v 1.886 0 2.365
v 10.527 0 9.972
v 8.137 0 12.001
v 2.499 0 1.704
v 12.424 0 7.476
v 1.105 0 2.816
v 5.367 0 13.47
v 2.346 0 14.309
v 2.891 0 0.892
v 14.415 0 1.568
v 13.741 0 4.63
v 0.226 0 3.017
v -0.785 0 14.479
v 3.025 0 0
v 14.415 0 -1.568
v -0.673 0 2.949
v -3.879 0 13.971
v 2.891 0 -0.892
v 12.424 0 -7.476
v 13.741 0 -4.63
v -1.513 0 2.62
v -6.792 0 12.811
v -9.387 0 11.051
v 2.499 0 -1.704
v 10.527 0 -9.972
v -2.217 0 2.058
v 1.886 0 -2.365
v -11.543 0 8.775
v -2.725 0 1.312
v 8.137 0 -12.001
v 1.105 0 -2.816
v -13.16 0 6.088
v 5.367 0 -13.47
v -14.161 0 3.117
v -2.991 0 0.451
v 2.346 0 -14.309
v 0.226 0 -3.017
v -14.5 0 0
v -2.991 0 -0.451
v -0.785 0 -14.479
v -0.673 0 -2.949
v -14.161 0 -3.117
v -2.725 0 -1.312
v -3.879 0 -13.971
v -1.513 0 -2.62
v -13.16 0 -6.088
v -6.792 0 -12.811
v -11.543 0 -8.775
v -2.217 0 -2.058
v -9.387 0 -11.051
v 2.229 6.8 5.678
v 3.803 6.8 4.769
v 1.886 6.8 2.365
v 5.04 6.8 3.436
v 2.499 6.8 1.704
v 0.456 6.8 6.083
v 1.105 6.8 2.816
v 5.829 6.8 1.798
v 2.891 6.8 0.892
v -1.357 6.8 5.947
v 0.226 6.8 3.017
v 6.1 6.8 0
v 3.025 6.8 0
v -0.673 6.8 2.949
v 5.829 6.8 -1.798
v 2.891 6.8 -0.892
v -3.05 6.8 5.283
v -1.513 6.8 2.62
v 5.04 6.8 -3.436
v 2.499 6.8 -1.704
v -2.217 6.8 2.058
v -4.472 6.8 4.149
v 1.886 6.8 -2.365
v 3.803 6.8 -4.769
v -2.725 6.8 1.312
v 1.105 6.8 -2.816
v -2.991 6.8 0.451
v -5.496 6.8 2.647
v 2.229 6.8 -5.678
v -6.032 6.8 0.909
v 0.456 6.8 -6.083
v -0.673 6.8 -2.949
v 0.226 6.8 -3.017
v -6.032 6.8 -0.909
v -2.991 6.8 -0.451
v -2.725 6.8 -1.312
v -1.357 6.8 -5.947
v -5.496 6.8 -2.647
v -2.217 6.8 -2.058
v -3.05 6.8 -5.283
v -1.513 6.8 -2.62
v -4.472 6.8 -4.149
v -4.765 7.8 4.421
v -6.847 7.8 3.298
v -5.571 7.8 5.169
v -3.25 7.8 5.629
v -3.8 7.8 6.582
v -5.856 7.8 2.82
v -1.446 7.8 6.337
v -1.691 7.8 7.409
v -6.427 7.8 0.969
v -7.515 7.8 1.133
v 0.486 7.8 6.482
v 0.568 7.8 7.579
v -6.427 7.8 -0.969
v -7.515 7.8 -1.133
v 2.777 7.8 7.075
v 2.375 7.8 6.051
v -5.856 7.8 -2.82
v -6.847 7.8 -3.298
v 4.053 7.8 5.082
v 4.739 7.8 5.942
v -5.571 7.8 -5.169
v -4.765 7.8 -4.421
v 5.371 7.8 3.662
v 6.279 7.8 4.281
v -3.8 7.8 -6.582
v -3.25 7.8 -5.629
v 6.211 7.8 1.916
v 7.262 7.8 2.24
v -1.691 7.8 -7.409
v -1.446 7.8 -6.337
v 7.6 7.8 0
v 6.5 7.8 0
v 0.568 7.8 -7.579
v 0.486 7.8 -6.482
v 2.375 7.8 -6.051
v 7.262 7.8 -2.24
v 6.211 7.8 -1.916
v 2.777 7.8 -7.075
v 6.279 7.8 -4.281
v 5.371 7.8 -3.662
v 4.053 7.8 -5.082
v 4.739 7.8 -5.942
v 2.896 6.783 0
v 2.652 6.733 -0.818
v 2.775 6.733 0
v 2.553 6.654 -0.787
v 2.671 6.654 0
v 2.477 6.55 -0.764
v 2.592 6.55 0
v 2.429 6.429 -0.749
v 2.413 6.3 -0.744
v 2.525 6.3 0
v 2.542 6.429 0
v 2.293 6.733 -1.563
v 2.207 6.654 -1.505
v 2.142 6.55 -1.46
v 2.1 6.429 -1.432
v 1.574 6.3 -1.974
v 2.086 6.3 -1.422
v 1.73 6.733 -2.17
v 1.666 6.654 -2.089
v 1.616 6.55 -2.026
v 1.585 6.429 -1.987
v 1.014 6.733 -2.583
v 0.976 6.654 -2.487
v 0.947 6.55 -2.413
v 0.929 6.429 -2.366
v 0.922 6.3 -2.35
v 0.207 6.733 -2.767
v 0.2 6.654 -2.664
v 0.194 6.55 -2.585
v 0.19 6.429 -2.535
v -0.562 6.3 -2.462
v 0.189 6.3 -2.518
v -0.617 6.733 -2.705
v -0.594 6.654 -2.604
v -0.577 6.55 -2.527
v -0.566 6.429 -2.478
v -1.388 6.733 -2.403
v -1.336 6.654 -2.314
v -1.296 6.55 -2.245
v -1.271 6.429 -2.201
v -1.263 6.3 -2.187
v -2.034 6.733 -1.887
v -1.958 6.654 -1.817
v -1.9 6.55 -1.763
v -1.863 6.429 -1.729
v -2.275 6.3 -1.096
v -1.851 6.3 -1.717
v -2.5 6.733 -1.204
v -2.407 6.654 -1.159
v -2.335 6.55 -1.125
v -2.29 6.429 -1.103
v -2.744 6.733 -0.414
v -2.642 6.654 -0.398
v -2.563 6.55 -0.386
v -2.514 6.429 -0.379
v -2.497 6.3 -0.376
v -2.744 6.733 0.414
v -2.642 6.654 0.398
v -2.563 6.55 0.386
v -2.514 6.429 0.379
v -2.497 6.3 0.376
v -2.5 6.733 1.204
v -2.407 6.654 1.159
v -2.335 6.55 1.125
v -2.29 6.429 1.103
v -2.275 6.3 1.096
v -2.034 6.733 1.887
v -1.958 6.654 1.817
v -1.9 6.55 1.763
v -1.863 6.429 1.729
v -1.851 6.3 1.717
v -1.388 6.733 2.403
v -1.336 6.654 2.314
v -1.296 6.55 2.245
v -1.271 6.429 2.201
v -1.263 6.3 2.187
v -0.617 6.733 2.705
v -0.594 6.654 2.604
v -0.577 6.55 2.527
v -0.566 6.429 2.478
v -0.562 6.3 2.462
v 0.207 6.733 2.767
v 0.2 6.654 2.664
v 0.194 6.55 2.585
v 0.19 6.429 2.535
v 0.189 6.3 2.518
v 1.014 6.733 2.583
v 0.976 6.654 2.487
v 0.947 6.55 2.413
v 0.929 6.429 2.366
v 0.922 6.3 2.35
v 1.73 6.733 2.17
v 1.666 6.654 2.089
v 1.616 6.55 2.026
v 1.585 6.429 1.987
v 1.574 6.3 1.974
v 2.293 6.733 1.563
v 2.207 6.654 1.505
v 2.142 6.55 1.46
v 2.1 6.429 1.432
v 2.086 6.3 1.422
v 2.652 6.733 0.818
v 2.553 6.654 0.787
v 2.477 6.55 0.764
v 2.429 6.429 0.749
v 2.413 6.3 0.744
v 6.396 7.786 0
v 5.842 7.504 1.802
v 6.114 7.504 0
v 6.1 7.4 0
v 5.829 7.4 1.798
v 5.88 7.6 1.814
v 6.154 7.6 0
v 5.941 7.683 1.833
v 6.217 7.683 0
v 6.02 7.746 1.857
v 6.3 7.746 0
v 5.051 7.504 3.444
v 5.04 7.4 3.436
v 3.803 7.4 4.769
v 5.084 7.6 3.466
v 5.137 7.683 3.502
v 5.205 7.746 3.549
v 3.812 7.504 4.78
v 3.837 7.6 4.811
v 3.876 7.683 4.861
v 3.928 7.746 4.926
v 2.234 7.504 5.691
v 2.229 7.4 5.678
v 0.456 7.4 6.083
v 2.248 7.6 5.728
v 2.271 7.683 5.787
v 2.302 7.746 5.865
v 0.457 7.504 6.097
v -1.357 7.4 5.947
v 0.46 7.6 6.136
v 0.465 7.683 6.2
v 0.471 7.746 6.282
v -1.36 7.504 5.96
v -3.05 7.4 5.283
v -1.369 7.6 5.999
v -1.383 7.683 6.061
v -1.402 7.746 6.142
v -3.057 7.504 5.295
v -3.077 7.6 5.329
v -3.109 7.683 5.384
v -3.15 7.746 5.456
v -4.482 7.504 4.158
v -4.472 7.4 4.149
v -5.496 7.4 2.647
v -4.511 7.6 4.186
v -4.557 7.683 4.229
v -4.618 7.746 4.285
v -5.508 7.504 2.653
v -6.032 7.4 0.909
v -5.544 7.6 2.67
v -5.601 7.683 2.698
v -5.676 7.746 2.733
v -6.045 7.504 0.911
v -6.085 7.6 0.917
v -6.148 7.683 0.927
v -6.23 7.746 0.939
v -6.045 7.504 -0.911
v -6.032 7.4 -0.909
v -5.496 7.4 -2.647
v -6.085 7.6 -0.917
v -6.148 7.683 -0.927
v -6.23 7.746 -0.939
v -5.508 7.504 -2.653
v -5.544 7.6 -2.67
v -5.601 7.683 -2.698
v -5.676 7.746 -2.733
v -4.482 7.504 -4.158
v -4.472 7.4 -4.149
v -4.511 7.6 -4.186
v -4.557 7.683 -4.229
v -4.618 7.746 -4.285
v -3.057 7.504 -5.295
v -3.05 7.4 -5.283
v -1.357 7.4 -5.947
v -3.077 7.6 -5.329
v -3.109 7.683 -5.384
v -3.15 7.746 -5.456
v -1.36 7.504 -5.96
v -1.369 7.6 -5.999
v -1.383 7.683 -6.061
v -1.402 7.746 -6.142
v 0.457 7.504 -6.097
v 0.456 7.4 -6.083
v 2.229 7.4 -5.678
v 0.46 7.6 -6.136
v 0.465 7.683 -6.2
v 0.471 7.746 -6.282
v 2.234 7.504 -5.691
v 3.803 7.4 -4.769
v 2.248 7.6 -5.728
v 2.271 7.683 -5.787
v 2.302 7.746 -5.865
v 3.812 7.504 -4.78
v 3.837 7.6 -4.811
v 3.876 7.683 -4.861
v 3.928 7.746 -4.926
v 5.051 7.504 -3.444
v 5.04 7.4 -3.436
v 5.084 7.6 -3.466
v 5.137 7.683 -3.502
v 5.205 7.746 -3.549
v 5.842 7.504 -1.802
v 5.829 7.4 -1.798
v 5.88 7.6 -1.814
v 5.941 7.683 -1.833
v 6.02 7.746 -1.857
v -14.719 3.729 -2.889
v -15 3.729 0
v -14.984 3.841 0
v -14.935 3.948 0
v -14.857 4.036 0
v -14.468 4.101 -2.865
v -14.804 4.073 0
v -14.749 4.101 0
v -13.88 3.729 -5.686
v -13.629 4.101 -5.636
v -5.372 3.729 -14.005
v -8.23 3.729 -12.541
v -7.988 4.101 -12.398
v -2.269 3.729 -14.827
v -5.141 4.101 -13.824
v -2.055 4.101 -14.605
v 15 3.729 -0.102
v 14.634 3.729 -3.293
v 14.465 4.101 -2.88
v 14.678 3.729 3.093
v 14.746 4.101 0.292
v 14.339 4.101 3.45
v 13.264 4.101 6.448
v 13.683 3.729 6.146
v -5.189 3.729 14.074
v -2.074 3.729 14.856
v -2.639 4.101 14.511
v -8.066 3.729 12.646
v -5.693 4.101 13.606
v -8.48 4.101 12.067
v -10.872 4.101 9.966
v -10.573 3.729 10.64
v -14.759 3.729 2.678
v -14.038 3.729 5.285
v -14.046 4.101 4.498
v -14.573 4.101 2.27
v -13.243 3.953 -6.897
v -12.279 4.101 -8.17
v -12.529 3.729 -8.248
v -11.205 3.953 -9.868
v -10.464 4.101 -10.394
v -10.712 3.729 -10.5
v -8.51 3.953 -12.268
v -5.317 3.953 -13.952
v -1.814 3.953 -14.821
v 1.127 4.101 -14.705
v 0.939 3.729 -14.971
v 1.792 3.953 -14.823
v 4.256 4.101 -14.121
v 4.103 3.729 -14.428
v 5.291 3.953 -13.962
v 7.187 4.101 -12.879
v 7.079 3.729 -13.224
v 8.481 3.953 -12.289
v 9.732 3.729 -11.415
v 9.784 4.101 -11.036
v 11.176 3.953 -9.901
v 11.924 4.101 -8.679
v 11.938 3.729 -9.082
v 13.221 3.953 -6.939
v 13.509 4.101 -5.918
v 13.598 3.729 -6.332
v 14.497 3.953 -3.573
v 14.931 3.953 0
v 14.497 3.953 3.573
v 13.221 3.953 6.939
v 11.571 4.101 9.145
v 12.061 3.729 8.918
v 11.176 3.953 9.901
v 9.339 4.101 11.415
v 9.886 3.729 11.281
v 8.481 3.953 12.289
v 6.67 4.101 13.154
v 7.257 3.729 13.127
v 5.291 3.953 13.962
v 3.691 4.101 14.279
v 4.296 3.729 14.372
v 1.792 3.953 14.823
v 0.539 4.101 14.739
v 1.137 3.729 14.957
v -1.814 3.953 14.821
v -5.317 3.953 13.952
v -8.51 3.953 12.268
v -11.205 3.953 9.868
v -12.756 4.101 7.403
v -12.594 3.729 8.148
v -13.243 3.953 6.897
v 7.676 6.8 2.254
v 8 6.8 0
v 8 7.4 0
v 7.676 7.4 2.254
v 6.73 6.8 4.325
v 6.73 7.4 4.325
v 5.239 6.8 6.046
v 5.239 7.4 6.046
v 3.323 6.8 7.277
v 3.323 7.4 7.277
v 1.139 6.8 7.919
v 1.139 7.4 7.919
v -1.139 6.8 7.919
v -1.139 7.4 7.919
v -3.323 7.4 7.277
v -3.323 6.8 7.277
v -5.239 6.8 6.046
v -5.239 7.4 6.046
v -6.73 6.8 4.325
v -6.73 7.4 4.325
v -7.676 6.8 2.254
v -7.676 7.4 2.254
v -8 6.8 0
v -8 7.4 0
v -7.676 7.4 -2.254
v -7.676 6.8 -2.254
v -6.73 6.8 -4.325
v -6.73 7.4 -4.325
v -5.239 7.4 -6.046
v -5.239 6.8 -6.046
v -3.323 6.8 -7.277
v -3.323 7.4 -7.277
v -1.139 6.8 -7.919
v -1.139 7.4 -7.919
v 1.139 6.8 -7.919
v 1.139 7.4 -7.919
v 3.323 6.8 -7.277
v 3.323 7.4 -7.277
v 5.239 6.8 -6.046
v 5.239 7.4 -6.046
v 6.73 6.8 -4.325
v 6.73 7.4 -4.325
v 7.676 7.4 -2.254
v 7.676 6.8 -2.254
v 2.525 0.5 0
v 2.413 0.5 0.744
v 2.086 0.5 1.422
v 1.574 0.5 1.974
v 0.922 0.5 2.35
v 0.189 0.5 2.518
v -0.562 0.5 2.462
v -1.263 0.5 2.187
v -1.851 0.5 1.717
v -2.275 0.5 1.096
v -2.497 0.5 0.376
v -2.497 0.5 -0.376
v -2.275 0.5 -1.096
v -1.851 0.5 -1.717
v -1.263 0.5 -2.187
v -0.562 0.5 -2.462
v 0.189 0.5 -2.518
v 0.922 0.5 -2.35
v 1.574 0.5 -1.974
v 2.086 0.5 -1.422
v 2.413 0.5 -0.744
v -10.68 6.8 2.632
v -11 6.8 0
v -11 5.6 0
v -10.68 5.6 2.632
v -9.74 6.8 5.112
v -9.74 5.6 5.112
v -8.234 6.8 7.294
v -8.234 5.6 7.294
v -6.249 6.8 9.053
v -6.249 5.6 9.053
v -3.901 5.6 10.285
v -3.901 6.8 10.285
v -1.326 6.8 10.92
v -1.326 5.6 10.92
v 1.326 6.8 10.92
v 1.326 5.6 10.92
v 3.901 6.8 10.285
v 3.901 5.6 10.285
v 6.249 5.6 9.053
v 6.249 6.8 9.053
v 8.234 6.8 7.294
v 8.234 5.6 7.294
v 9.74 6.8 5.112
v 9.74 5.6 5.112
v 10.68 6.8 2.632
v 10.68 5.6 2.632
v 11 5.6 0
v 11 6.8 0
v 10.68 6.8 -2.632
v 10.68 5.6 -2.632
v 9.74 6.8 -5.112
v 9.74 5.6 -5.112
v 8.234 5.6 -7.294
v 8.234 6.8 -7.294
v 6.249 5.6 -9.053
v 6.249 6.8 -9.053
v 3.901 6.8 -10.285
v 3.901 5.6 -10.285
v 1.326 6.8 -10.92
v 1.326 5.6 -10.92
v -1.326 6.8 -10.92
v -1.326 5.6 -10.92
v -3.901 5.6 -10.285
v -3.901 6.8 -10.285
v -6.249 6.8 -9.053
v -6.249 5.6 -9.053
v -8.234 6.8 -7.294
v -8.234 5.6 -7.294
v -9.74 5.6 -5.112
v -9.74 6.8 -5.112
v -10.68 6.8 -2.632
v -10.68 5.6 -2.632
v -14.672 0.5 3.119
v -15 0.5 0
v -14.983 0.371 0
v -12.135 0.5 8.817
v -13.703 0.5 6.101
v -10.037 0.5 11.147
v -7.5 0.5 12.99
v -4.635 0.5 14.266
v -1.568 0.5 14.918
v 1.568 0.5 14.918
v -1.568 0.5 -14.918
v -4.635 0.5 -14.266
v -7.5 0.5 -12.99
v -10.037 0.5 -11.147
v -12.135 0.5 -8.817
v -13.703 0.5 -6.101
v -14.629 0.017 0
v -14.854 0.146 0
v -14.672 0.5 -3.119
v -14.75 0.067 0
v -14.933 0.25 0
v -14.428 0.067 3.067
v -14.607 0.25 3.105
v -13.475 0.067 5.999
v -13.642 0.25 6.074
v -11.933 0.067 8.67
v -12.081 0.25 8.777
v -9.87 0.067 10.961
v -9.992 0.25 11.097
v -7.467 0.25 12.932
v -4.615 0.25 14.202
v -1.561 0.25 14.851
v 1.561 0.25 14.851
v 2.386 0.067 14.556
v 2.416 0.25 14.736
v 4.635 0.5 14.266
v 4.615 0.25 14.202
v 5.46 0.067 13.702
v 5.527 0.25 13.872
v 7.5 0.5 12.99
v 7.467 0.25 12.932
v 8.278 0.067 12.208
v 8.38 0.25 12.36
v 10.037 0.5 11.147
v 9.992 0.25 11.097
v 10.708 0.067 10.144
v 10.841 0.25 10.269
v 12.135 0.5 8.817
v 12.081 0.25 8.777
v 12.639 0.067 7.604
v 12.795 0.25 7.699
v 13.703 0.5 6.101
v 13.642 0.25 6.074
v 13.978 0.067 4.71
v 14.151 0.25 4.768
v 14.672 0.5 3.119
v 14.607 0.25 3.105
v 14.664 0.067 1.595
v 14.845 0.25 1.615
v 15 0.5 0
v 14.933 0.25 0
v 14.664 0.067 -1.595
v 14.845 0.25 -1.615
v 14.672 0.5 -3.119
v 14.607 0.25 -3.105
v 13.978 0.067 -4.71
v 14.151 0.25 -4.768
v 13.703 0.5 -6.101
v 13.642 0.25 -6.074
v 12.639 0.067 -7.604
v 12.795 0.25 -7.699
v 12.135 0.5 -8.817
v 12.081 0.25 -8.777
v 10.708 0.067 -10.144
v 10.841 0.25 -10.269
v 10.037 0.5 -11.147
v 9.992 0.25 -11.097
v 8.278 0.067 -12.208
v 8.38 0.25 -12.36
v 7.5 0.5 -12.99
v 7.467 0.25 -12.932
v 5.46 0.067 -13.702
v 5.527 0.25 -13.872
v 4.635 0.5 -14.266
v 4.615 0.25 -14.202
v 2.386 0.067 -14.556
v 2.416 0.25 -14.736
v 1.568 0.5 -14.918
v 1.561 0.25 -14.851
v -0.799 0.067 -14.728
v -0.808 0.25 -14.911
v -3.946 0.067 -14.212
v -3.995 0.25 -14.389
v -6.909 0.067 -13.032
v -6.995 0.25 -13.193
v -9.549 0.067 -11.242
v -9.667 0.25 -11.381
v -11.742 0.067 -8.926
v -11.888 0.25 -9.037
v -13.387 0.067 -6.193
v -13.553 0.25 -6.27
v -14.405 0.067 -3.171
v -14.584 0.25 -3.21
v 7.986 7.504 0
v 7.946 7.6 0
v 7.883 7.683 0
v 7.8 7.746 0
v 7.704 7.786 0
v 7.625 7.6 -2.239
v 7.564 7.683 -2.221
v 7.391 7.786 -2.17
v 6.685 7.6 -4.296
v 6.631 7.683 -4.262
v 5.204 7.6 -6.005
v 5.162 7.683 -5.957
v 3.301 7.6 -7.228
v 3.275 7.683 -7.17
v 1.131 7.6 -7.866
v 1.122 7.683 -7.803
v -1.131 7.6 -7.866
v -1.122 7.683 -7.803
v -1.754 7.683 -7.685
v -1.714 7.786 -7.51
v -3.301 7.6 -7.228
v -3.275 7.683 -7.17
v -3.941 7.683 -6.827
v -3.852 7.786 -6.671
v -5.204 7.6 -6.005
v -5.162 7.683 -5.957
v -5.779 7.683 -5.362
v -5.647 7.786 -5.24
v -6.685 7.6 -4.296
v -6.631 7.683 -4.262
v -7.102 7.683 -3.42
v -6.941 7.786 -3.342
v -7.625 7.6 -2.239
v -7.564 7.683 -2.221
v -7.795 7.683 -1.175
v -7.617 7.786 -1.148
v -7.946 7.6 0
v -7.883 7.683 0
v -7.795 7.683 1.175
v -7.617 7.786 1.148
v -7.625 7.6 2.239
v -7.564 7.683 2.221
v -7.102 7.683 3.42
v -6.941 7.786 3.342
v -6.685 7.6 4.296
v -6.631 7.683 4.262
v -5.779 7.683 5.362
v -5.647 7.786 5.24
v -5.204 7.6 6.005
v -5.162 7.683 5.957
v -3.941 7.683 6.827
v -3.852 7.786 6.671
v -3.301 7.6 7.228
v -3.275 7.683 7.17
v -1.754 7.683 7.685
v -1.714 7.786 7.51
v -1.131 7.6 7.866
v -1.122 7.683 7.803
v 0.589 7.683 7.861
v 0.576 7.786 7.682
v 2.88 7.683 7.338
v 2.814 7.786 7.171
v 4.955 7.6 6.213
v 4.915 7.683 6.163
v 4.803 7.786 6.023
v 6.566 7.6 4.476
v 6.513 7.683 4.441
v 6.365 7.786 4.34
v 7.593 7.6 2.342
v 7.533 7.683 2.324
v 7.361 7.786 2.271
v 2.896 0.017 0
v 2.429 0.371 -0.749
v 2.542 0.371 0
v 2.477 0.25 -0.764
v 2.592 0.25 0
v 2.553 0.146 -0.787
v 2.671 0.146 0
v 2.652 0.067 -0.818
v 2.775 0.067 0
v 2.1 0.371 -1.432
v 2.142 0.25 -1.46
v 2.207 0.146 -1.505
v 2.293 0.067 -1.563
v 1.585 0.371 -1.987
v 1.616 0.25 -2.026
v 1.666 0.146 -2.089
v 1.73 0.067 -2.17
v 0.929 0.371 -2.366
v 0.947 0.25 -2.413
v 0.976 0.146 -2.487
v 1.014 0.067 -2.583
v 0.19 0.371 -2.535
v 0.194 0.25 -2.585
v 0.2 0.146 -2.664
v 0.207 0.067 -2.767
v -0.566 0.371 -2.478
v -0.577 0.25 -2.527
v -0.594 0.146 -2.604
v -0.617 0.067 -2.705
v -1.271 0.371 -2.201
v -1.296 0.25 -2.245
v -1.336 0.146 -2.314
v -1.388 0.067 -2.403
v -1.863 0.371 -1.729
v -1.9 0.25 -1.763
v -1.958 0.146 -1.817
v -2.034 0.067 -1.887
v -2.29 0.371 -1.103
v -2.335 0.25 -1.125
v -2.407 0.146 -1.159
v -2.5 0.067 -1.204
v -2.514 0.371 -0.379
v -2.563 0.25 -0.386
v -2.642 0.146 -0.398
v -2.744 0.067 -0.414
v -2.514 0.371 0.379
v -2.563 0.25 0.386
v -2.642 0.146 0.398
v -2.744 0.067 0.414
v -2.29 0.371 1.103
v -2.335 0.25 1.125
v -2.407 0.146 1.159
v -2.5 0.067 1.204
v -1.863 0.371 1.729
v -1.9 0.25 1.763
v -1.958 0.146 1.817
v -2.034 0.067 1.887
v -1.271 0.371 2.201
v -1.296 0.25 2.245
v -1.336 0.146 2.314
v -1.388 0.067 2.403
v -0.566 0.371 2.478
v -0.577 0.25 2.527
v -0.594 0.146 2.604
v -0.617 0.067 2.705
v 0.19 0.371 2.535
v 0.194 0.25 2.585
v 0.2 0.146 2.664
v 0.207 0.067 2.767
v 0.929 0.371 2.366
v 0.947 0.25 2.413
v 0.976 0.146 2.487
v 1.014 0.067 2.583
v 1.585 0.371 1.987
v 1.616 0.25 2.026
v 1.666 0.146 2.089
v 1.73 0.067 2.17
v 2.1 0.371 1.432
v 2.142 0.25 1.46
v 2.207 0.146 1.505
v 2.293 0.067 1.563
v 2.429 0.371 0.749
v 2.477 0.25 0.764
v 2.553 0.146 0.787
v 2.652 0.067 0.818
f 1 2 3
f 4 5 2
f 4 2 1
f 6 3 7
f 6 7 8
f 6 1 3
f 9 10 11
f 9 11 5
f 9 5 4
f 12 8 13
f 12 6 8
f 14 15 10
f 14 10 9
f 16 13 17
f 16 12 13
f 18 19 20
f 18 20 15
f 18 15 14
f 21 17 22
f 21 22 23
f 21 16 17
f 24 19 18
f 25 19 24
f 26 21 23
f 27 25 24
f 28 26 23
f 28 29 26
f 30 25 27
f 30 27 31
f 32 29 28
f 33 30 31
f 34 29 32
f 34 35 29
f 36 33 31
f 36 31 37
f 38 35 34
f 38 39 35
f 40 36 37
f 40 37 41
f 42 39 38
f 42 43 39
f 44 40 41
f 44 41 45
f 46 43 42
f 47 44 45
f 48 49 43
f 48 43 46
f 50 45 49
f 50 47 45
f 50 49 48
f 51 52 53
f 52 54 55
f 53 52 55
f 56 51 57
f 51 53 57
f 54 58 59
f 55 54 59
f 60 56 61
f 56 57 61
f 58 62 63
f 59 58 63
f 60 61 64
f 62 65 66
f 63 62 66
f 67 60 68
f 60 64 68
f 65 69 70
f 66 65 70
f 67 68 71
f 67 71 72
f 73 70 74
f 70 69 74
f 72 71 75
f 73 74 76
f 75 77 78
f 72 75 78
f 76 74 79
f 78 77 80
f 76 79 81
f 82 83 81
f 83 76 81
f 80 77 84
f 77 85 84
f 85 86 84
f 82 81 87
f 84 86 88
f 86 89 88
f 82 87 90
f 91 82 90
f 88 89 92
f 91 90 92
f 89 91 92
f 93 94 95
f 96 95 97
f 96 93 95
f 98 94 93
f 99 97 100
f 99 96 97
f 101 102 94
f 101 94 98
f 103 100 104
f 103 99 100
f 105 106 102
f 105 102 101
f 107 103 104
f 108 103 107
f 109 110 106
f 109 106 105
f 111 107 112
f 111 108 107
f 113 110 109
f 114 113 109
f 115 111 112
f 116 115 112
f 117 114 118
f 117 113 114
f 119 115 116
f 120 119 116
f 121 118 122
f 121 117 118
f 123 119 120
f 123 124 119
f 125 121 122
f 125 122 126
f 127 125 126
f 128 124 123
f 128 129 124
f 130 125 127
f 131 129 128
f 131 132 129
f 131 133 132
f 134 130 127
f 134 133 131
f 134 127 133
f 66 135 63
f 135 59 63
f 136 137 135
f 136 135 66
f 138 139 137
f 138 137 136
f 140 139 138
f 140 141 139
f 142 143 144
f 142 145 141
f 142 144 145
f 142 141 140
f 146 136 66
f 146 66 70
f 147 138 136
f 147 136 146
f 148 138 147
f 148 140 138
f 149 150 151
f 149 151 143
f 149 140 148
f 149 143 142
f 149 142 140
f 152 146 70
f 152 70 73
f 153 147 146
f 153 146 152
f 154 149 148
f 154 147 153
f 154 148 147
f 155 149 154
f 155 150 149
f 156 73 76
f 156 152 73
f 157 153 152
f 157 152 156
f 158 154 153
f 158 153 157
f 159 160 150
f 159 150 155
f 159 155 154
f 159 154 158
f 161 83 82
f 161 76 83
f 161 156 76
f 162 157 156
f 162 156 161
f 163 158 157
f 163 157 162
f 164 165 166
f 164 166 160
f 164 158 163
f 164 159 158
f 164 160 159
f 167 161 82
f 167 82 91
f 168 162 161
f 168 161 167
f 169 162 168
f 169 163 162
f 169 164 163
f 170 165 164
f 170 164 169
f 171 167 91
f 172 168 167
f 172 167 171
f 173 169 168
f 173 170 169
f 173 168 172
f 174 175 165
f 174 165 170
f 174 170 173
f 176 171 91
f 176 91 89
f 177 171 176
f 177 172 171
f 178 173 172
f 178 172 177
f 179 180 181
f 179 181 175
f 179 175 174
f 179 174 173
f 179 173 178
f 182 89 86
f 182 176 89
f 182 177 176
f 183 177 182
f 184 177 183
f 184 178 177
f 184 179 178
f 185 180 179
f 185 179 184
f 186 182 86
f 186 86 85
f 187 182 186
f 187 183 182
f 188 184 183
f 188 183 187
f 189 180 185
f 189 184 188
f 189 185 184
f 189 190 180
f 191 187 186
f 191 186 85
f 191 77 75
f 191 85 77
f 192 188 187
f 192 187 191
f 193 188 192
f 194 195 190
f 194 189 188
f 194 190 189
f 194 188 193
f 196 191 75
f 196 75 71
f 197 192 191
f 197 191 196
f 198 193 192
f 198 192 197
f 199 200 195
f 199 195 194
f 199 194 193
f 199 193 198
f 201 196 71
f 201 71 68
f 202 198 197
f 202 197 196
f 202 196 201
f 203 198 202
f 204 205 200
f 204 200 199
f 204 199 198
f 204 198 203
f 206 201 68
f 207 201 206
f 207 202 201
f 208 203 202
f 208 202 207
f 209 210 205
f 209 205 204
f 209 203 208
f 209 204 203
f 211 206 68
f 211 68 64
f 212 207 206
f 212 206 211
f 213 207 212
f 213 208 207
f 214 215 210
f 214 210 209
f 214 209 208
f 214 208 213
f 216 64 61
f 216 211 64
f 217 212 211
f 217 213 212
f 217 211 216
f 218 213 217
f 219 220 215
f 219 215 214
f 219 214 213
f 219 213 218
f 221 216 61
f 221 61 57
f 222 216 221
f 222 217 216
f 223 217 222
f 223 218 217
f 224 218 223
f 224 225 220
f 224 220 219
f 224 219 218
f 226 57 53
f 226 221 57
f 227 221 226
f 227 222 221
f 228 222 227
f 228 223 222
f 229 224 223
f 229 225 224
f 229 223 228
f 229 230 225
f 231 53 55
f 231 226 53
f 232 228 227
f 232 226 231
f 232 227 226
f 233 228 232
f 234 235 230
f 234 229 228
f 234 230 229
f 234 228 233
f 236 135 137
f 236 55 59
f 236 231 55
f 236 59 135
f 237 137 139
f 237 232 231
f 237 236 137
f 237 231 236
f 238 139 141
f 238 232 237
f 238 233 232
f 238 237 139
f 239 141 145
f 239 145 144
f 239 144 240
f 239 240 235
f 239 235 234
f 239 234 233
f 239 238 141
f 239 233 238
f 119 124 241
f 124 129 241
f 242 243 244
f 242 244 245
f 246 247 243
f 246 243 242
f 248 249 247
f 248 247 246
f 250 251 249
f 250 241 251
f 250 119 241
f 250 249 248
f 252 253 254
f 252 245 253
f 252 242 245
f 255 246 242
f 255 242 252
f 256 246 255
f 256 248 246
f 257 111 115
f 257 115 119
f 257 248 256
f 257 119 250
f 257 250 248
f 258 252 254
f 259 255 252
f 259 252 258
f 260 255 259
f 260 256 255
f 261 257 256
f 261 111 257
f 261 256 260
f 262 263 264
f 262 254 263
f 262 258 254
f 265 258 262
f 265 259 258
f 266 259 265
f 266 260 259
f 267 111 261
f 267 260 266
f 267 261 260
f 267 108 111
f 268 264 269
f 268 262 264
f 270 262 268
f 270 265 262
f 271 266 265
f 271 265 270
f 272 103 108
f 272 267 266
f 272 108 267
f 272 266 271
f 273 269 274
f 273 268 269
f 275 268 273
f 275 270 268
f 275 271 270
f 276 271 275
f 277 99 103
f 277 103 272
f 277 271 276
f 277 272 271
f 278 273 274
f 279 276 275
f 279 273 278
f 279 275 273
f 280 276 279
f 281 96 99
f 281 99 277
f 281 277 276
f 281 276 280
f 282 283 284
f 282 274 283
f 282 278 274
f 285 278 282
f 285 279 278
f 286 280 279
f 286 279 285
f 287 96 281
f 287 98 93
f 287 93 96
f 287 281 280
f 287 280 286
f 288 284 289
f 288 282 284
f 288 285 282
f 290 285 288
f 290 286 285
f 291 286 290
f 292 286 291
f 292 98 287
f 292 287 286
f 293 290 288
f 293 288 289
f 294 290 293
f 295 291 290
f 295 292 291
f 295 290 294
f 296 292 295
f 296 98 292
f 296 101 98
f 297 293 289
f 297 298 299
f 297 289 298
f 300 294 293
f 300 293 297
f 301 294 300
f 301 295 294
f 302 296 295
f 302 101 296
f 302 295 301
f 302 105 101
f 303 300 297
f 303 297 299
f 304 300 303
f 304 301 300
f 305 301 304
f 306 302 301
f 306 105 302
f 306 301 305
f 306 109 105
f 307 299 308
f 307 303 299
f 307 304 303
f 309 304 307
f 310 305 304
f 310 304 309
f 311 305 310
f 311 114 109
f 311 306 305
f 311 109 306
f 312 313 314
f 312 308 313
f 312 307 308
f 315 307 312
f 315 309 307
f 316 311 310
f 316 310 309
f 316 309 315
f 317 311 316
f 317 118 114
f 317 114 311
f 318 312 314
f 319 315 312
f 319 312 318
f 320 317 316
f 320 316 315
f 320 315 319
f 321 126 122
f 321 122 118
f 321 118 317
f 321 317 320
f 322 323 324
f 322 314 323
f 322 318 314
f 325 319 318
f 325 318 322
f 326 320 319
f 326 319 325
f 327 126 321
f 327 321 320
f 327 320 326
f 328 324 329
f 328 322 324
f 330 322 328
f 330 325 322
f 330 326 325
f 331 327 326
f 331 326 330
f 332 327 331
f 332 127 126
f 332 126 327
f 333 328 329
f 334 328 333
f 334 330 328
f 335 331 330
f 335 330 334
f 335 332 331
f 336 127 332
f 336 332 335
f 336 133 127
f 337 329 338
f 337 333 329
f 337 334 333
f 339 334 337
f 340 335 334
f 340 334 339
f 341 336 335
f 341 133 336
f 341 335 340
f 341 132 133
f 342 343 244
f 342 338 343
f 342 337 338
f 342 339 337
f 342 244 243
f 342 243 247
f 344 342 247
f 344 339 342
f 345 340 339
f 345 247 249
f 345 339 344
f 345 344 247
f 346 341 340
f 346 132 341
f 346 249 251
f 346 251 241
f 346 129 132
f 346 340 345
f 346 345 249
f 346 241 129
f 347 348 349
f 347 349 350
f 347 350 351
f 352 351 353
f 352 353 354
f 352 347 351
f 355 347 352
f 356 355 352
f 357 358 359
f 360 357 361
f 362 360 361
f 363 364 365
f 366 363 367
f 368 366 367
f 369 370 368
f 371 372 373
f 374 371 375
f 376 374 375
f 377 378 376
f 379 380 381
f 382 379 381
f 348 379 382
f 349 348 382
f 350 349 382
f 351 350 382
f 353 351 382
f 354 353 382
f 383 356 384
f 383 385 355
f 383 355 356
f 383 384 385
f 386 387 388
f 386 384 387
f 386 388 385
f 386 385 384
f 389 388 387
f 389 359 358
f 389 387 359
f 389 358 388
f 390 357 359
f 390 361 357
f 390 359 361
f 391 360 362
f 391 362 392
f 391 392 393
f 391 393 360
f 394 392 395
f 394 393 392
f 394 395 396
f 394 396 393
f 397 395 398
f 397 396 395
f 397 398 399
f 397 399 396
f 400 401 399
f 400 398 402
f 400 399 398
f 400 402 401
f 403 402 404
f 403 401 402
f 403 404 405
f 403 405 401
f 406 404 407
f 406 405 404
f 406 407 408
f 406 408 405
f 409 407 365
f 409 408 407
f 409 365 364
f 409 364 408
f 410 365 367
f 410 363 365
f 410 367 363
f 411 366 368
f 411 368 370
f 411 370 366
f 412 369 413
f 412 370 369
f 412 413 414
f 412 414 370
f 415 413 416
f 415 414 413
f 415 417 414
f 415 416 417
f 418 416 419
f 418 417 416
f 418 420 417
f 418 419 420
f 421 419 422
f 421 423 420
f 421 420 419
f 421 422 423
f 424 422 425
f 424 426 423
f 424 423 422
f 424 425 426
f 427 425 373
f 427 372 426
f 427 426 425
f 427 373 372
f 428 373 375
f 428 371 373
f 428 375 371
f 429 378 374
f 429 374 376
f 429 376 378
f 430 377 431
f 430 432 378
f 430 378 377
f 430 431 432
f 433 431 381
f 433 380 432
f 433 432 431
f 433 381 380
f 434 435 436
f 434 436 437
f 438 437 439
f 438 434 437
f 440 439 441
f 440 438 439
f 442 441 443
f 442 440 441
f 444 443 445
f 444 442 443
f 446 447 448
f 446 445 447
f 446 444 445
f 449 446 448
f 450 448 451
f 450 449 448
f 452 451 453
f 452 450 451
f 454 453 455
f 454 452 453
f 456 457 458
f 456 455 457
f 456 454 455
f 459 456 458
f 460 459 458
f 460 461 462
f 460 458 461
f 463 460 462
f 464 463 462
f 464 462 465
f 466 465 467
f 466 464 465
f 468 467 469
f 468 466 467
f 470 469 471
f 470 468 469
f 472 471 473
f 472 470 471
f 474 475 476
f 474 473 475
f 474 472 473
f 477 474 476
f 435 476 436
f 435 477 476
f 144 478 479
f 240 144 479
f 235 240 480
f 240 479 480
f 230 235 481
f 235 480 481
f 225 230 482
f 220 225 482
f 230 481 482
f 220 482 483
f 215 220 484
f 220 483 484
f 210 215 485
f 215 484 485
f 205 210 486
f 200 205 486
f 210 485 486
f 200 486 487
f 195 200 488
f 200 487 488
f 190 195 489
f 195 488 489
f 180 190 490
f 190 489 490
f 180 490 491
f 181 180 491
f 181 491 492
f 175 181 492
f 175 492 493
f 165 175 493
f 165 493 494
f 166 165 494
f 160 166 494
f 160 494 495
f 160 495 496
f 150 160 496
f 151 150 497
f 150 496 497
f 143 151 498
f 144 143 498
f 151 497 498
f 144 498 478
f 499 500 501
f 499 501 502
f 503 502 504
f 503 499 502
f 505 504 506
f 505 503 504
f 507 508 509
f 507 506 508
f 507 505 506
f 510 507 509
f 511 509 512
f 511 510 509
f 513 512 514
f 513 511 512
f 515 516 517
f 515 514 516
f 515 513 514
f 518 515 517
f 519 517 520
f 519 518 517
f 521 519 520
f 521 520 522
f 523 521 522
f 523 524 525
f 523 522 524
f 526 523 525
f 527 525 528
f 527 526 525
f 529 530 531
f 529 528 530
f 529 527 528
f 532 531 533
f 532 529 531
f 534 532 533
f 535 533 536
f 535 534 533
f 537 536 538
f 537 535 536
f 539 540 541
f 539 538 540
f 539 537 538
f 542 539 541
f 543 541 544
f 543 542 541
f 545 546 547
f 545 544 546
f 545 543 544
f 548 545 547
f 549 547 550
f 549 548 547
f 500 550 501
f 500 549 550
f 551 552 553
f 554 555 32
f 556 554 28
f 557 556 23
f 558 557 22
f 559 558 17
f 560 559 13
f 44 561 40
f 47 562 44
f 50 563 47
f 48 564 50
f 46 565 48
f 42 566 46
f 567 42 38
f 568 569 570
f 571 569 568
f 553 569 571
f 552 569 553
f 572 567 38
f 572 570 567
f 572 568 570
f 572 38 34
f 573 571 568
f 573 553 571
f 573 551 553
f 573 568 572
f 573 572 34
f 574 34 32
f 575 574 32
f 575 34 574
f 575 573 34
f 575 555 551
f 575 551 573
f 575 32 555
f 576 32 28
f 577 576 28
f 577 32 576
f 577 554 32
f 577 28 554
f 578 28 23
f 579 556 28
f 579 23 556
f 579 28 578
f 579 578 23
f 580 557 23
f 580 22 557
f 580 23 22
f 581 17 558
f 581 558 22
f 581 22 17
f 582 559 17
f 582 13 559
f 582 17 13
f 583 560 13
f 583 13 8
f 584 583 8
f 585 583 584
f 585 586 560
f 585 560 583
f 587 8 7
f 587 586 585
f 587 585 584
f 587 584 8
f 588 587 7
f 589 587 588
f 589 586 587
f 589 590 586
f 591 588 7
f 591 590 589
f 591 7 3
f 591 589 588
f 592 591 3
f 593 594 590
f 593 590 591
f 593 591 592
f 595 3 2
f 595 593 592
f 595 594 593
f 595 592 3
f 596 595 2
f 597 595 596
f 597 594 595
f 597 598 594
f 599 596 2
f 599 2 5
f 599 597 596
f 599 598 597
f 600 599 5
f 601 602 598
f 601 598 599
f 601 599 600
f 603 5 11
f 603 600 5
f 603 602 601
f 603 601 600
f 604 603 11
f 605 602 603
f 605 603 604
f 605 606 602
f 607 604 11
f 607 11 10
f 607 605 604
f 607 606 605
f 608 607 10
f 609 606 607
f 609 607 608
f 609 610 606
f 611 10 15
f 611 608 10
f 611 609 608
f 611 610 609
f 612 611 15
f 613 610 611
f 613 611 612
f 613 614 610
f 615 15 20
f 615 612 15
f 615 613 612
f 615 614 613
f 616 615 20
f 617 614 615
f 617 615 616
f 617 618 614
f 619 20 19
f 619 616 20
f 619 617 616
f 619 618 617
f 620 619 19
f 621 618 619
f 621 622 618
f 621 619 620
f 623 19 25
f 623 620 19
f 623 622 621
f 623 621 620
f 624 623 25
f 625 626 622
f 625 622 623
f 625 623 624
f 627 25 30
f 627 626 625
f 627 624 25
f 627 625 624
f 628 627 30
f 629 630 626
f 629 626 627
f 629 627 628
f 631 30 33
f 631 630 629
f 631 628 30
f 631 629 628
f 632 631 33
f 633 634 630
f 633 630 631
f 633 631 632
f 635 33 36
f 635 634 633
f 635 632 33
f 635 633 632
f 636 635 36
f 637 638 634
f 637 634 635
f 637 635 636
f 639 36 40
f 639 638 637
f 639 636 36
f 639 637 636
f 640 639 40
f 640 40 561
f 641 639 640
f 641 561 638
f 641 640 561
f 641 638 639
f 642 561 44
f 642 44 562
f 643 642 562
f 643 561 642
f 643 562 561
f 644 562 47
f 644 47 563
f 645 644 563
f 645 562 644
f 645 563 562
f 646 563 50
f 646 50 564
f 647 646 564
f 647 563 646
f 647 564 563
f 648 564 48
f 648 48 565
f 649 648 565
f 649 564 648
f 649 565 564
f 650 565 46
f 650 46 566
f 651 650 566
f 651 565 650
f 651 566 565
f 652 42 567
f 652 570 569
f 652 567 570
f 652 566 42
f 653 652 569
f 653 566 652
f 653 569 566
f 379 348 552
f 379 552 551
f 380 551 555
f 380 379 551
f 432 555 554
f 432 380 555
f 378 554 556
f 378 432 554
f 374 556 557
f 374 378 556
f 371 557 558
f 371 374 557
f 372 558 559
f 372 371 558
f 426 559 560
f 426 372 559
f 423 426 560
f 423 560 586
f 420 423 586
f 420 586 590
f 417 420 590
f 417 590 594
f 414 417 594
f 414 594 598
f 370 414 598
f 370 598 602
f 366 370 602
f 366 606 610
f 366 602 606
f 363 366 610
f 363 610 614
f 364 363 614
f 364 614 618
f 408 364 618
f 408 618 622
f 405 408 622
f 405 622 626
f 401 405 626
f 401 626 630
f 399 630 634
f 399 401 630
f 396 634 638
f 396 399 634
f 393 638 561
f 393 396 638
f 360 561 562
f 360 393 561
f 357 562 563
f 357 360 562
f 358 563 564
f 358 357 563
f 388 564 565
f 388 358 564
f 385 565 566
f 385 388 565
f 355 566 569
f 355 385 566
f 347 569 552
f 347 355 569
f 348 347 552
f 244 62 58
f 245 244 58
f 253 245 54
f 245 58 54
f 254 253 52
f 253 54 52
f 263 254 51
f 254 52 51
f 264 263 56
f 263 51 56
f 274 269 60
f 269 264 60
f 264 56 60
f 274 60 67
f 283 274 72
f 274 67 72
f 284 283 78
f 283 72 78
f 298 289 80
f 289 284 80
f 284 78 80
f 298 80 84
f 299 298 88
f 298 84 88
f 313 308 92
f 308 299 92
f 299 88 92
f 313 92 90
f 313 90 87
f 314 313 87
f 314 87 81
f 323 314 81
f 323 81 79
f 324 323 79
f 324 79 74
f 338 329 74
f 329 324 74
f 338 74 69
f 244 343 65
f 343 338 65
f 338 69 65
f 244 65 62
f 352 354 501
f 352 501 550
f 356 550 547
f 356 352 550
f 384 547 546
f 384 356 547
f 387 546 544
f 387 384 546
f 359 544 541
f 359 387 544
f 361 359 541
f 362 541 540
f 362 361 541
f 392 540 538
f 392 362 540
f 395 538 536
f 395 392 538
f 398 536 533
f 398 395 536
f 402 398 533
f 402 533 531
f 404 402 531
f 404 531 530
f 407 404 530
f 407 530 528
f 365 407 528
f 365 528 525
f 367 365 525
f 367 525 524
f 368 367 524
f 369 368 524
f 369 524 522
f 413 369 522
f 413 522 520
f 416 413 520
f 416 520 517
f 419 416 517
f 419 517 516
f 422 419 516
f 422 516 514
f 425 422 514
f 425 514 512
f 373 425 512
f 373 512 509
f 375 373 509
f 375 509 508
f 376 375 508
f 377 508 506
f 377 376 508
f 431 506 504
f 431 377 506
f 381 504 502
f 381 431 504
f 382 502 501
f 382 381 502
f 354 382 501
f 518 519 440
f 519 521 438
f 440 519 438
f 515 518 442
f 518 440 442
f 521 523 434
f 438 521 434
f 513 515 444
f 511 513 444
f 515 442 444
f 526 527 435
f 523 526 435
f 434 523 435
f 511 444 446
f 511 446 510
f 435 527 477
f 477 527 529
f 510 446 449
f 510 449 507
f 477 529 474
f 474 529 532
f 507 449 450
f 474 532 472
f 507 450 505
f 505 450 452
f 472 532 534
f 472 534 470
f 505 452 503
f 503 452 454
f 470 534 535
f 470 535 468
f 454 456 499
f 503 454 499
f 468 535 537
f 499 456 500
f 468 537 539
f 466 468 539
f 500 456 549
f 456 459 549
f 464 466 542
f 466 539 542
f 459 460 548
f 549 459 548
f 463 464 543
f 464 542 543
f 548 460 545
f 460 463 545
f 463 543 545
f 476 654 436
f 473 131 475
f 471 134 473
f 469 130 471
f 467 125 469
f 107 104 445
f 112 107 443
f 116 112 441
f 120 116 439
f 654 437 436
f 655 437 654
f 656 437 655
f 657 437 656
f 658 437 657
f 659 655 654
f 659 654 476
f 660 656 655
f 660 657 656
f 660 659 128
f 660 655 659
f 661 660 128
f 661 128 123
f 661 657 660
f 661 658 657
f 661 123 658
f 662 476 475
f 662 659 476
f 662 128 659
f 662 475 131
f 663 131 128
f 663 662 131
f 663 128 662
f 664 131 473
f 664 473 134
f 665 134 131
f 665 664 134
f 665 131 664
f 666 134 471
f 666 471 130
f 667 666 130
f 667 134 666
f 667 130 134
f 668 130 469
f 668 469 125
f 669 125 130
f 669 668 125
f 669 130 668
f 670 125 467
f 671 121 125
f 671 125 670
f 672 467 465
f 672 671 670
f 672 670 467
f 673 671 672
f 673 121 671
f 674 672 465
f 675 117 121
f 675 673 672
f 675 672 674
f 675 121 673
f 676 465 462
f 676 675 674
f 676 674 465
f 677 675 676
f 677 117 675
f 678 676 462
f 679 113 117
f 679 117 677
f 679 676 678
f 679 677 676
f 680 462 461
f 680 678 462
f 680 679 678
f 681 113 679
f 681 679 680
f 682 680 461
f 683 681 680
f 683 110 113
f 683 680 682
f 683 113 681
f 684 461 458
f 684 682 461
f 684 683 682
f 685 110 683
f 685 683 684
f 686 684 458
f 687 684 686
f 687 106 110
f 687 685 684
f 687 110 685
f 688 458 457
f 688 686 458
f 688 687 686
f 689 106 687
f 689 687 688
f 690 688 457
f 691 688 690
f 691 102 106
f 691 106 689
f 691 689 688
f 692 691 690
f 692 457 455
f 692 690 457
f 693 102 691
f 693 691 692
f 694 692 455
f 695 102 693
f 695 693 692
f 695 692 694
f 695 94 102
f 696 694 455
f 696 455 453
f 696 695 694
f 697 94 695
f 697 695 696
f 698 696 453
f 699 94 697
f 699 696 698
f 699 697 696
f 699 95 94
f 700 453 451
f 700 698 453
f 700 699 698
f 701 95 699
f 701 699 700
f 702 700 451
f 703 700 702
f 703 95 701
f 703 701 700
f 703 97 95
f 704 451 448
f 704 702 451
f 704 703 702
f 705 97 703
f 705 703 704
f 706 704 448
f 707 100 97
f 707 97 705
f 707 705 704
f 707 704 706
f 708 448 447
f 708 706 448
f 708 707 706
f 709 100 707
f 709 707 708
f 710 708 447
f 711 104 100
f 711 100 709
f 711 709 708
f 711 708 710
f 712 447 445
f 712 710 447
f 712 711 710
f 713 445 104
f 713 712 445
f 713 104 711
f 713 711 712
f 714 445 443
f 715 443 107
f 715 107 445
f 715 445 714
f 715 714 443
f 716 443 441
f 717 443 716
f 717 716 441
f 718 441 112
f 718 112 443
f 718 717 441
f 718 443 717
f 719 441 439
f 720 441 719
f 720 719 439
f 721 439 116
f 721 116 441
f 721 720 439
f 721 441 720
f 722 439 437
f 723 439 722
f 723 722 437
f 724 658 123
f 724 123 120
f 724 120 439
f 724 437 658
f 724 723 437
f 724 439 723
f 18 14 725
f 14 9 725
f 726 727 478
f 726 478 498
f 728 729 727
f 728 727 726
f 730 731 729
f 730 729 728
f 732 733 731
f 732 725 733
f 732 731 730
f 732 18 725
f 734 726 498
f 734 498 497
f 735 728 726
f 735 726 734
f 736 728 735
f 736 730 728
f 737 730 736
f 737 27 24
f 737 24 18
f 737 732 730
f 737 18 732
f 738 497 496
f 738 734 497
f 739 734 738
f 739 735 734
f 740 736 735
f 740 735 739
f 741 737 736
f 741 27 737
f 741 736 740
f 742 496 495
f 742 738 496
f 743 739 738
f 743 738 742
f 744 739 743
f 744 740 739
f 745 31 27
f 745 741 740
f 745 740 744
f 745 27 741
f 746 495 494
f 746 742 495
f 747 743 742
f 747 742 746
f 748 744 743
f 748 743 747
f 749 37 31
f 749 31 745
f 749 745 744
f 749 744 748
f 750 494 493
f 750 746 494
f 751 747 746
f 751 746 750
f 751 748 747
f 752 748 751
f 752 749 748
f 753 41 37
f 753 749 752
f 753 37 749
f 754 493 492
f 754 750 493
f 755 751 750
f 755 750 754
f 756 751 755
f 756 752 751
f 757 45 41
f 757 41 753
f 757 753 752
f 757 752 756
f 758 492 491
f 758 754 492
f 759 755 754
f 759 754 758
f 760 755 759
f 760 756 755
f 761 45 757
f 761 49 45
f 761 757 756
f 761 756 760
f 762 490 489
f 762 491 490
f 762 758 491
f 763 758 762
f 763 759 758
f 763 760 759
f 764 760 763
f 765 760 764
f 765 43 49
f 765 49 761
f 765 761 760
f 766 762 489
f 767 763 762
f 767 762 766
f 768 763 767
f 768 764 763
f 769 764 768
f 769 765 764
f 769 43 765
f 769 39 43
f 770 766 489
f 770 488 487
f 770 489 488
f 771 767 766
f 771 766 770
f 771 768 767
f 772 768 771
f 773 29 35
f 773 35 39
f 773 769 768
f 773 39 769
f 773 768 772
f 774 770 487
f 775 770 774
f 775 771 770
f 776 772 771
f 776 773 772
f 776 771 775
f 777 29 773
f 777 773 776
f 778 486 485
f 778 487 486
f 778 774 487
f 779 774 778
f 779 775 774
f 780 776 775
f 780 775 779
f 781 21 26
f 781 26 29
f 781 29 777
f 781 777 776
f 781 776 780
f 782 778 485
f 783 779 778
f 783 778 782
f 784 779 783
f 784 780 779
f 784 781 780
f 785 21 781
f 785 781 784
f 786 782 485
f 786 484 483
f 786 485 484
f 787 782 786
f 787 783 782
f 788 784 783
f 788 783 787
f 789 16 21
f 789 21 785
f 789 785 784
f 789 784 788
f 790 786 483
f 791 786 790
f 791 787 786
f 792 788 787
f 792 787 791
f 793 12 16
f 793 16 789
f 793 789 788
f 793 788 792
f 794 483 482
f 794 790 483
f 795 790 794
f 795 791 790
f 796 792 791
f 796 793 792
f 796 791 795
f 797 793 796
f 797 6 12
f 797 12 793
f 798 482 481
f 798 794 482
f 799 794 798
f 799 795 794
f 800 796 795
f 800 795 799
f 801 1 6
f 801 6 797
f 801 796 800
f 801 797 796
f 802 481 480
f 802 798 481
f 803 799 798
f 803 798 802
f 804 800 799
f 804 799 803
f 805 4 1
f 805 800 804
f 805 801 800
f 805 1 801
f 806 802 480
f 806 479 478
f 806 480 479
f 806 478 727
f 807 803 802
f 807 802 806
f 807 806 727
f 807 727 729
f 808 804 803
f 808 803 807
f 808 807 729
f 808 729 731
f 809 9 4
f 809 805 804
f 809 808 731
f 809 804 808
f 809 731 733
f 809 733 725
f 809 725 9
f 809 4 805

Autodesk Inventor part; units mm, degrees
ref_plane "YZ Plane" through (0, 0, 0) normal (1, 0, 0) x (0, 1, 0)
ref_plane "XZ Plane" through (0, 0, 0) normal (0, 1, 0) x (-1, 0, 0)
ref_plane "XY Plane" through (0, 0, 0) normal (0, 0, 1) x (1, 0, 0)
sketch "Sketch1" plane through (0, 0, 0) normal (0, 0, 1) x (1, 0, 0)
  line L0 (0, 0) -> (-15, 0)
  line L1 (-15, 0) -> (-15, 4)
  line L2 (-15, 4) -> (-11, 5.6)
  line L3 (-11, 5.6) -> (-11, 6.8)
  line L4 (-11, 6.8) -> (0, 6.8)
  line L5 (0, 6.8) -> (0, 0)
  dimension "d1" = 4
  dimension "d5" = 1.2
  dimension "d12" = 11
  dimension "d13" = 2.8
  dimension "d14" = 4
revolve "Revolution1" add sketch "Sketch1" angle 360 about axis through (0, 6.8, 0) along (0, -1, 0)
fillet "Fillet1" radius 0.5 1 edges at (15, 0, 0)
sketch "Sketch3" plane through (0, 0, 0) normal (0, -1, 0) x (1, 0, 0)
  circle A0 centre (0, 0) radius 2.525
  point P0 (0, 0)
  dimension "d15" = 5.05
extrude "Extrusion2" cut sketch "Sketch3" against normal up to surface (6.8 mm away)
fillet "Fillet2" radius 0.4 1 edges at (15, 4, 0)
sketch "Sketch4" plane through (0, 6.8, 0) normal (0, 1, 0) x (1, 0, 0)
  circle A0 centre (0, 0) radius 8
  circle A1 centre (0, 0) radius 6.1
  point P0 (0, 0)
  dimension "d19" = 16
  dimension "d20" = 1.9
extrude "Extrusion3" add sketch "Sketch4" along normal blind 1
fillet "Fillet3" radius 0.4 2 edges at (-6.1, 7.8, 0) (-8, 7.8, 0)
fillet "Fillet4" radius 0.5 2 edges at (-2.525, 6.8, 0) (-2.525, 0, 0)
properties part number "pulley_part_1"
